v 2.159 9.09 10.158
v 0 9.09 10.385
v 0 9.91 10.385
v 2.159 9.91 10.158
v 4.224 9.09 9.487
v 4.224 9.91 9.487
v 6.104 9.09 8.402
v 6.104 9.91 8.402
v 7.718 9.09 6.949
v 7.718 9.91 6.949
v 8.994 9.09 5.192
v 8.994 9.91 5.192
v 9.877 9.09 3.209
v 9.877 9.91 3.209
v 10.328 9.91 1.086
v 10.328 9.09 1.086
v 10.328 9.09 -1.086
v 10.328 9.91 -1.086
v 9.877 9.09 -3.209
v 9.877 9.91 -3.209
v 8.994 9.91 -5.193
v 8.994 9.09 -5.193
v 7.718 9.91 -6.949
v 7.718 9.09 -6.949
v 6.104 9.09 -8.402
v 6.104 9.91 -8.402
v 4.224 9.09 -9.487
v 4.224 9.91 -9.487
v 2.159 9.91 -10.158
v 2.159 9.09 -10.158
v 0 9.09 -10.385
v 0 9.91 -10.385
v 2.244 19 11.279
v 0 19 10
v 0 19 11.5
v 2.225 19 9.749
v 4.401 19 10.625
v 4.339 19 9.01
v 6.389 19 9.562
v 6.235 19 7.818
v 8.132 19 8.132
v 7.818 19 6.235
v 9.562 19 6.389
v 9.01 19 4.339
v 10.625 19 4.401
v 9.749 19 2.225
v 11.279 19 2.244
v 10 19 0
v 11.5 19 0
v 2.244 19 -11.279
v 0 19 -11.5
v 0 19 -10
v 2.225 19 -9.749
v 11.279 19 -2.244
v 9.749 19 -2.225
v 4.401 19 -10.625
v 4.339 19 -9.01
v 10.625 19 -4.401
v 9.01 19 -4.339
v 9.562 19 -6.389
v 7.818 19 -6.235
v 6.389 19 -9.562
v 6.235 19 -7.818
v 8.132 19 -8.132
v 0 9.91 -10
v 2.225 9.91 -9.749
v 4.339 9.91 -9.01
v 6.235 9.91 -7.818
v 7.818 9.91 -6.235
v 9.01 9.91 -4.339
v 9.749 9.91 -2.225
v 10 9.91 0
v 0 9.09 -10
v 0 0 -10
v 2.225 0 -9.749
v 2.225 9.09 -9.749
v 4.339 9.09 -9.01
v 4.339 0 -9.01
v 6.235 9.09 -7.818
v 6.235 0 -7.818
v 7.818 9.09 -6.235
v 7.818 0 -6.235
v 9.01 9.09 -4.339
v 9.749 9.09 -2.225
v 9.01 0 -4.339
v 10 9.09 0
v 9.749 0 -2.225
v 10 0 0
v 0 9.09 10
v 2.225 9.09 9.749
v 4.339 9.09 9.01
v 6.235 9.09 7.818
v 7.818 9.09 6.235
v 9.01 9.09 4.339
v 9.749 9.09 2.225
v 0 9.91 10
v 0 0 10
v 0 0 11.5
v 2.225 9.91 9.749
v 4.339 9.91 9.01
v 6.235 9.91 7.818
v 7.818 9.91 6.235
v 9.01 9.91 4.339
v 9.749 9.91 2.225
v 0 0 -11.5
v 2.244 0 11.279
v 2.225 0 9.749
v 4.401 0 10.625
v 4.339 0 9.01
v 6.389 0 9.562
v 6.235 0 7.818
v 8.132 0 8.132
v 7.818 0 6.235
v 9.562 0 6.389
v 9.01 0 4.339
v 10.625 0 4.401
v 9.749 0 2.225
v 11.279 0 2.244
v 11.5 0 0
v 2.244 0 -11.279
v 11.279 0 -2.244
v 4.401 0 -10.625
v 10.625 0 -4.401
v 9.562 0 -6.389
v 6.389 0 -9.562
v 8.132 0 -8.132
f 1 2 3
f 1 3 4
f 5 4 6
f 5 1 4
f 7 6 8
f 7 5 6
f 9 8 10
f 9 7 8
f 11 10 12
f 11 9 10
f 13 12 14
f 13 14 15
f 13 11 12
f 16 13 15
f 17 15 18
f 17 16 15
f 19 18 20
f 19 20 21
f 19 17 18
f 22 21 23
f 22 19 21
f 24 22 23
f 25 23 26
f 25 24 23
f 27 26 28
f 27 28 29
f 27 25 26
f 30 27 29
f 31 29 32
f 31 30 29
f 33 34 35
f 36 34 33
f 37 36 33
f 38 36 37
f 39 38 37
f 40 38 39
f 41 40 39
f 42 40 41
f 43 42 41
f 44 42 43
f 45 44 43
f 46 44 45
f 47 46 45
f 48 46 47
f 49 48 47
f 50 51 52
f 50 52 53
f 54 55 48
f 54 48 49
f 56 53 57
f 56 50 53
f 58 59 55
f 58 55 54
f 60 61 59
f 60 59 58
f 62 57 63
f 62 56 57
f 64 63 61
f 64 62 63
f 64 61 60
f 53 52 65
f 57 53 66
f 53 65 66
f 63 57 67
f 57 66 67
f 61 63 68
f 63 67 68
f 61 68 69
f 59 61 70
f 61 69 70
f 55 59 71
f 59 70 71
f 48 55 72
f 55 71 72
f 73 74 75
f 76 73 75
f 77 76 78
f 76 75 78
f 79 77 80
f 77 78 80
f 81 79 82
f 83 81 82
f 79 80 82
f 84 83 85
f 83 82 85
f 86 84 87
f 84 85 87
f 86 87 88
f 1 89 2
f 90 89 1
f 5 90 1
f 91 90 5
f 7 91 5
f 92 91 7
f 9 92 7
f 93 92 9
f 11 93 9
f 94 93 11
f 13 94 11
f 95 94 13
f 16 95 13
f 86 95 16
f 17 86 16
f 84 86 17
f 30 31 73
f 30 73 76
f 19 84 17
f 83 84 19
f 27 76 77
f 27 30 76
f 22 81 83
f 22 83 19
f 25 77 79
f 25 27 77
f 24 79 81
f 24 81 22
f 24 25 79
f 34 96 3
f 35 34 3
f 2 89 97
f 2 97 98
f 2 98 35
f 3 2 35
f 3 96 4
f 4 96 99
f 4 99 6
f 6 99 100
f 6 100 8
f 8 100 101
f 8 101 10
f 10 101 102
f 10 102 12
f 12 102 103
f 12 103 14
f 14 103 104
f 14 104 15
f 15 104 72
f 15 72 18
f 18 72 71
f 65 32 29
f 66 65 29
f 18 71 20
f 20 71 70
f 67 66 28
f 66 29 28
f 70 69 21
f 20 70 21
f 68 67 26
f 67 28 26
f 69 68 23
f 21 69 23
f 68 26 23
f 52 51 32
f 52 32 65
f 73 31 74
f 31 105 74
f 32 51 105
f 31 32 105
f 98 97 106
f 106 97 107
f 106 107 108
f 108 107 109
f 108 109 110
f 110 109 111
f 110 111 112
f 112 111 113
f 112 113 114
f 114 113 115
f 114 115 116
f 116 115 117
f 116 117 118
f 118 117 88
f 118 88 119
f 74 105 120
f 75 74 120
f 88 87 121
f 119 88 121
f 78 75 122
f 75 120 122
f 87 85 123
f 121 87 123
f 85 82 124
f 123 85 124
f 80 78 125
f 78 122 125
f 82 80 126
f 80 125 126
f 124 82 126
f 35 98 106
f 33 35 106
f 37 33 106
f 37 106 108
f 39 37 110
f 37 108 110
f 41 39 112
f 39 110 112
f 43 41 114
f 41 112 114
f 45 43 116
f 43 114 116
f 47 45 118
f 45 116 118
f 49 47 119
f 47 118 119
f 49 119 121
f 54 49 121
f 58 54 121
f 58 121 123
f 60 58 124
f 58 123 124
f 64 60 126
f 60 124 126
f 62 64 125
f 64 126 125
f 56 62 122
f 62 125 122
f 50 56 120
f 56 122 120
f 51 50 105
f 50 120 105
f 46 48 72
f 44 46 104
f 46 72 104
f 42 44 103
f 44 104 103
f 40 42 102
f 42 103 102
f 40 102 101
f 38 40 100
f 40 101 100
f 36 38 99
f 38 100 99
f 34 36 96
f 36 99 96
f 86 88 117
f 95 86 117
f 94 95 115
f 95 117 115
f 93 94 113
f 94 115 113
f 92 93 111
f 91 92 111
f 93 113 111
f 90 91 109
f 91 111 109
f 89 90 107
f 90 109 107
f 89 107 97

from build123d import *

# Parameters (mm, degrees)
BOSS_EXTRUDE1_DEPTH       = 19
CUT_REVOLVE_THIN4_START   = 9.090052714
CUT_REVOLVE_THIN4_DEPTH   = 0.819894572
CUT_REVOLVE_THIN4_START_2 = 9.100052714
CUT_REVOLVE_THIN4_2_DEPTH = 0.799894572


with BuildPart() as part:
    # Sketch1 → Boss-Extrude1 (new body)
    with BuildSketch(Plane(origin=(0, 0, 0), x_dir=(1, 0, 0), z_dir=(0, 1, 0))):
        with BuildLine():
            Line((0, -10), (0, -11.5))
            ThreePointArc((0, -11.5), (8.131727984, -8.131727984), (11.5, 0))
            ThreePointArc((11.5, 0), (8.131727984, 8.131727984), (0, 11.5))
            Line((0, 11.5), (0, 10))
            ThreePointArc((0, 10), (7.071067812, 7.071067812), (10, 0))
            ThreePointArc((10, 0), (7.071067812, -7.071067812), (0, -10))
        make_face()
    extrude(amount=BOSS_EXTRUDE1_DEPTH)

    # Cut-Revolve-Thin4: read off the stored shape, not the designer's step
    # Cut-Revolve-Thin4 outline → Cut-Revolve-Thin4 (cut)
    with BuildSketch(Plane(origin=(0, 0, 0), x_dir=(1, 0, 0), z_dir=(0, 1, 0)).offset(CUT_REVOLVE_THIN4_START)):
        with BuildLine():
            ThreePointArc((0, -10.385), (10.385, 0), (0, 10.385))
            Line((0, 10.385), (0, 10))
            ThreePointArc((0, 10), (10, 0), (0, -10))
            Line((0, -10), (0, -10.385))
        make_face()
    extrude(amount=CUT_REVOLVE_THIN4_DEPTH, mode=Mode.SUBTRACT)


with BuildPart() as body_2:
    # Cut-Revolve-Thin4 2 outline → Cut-Revolve-Thin4 2 (new body)
    with BuildSketch(Plane(origin=(0, 0, 0), x_dir=(1, 0, 0), z_dir=(0, 1, 0)).offset(CUT_REVOLVE_THIN4_START_2)):
        with BuildLine():
            Line((0, 10.375), (0, 10))
            ThreePointArc((0, 10), (10, 0), (0, -10))
            Line((0, -10), (0, -10.375))
            ThreePointArc((0, -10.375), (10.375, 0), (0, 10.375))
        make_face()
    extrude(amount=CUT_REVOLVE_THIN4_2_DEPTH)


solid = part.part
